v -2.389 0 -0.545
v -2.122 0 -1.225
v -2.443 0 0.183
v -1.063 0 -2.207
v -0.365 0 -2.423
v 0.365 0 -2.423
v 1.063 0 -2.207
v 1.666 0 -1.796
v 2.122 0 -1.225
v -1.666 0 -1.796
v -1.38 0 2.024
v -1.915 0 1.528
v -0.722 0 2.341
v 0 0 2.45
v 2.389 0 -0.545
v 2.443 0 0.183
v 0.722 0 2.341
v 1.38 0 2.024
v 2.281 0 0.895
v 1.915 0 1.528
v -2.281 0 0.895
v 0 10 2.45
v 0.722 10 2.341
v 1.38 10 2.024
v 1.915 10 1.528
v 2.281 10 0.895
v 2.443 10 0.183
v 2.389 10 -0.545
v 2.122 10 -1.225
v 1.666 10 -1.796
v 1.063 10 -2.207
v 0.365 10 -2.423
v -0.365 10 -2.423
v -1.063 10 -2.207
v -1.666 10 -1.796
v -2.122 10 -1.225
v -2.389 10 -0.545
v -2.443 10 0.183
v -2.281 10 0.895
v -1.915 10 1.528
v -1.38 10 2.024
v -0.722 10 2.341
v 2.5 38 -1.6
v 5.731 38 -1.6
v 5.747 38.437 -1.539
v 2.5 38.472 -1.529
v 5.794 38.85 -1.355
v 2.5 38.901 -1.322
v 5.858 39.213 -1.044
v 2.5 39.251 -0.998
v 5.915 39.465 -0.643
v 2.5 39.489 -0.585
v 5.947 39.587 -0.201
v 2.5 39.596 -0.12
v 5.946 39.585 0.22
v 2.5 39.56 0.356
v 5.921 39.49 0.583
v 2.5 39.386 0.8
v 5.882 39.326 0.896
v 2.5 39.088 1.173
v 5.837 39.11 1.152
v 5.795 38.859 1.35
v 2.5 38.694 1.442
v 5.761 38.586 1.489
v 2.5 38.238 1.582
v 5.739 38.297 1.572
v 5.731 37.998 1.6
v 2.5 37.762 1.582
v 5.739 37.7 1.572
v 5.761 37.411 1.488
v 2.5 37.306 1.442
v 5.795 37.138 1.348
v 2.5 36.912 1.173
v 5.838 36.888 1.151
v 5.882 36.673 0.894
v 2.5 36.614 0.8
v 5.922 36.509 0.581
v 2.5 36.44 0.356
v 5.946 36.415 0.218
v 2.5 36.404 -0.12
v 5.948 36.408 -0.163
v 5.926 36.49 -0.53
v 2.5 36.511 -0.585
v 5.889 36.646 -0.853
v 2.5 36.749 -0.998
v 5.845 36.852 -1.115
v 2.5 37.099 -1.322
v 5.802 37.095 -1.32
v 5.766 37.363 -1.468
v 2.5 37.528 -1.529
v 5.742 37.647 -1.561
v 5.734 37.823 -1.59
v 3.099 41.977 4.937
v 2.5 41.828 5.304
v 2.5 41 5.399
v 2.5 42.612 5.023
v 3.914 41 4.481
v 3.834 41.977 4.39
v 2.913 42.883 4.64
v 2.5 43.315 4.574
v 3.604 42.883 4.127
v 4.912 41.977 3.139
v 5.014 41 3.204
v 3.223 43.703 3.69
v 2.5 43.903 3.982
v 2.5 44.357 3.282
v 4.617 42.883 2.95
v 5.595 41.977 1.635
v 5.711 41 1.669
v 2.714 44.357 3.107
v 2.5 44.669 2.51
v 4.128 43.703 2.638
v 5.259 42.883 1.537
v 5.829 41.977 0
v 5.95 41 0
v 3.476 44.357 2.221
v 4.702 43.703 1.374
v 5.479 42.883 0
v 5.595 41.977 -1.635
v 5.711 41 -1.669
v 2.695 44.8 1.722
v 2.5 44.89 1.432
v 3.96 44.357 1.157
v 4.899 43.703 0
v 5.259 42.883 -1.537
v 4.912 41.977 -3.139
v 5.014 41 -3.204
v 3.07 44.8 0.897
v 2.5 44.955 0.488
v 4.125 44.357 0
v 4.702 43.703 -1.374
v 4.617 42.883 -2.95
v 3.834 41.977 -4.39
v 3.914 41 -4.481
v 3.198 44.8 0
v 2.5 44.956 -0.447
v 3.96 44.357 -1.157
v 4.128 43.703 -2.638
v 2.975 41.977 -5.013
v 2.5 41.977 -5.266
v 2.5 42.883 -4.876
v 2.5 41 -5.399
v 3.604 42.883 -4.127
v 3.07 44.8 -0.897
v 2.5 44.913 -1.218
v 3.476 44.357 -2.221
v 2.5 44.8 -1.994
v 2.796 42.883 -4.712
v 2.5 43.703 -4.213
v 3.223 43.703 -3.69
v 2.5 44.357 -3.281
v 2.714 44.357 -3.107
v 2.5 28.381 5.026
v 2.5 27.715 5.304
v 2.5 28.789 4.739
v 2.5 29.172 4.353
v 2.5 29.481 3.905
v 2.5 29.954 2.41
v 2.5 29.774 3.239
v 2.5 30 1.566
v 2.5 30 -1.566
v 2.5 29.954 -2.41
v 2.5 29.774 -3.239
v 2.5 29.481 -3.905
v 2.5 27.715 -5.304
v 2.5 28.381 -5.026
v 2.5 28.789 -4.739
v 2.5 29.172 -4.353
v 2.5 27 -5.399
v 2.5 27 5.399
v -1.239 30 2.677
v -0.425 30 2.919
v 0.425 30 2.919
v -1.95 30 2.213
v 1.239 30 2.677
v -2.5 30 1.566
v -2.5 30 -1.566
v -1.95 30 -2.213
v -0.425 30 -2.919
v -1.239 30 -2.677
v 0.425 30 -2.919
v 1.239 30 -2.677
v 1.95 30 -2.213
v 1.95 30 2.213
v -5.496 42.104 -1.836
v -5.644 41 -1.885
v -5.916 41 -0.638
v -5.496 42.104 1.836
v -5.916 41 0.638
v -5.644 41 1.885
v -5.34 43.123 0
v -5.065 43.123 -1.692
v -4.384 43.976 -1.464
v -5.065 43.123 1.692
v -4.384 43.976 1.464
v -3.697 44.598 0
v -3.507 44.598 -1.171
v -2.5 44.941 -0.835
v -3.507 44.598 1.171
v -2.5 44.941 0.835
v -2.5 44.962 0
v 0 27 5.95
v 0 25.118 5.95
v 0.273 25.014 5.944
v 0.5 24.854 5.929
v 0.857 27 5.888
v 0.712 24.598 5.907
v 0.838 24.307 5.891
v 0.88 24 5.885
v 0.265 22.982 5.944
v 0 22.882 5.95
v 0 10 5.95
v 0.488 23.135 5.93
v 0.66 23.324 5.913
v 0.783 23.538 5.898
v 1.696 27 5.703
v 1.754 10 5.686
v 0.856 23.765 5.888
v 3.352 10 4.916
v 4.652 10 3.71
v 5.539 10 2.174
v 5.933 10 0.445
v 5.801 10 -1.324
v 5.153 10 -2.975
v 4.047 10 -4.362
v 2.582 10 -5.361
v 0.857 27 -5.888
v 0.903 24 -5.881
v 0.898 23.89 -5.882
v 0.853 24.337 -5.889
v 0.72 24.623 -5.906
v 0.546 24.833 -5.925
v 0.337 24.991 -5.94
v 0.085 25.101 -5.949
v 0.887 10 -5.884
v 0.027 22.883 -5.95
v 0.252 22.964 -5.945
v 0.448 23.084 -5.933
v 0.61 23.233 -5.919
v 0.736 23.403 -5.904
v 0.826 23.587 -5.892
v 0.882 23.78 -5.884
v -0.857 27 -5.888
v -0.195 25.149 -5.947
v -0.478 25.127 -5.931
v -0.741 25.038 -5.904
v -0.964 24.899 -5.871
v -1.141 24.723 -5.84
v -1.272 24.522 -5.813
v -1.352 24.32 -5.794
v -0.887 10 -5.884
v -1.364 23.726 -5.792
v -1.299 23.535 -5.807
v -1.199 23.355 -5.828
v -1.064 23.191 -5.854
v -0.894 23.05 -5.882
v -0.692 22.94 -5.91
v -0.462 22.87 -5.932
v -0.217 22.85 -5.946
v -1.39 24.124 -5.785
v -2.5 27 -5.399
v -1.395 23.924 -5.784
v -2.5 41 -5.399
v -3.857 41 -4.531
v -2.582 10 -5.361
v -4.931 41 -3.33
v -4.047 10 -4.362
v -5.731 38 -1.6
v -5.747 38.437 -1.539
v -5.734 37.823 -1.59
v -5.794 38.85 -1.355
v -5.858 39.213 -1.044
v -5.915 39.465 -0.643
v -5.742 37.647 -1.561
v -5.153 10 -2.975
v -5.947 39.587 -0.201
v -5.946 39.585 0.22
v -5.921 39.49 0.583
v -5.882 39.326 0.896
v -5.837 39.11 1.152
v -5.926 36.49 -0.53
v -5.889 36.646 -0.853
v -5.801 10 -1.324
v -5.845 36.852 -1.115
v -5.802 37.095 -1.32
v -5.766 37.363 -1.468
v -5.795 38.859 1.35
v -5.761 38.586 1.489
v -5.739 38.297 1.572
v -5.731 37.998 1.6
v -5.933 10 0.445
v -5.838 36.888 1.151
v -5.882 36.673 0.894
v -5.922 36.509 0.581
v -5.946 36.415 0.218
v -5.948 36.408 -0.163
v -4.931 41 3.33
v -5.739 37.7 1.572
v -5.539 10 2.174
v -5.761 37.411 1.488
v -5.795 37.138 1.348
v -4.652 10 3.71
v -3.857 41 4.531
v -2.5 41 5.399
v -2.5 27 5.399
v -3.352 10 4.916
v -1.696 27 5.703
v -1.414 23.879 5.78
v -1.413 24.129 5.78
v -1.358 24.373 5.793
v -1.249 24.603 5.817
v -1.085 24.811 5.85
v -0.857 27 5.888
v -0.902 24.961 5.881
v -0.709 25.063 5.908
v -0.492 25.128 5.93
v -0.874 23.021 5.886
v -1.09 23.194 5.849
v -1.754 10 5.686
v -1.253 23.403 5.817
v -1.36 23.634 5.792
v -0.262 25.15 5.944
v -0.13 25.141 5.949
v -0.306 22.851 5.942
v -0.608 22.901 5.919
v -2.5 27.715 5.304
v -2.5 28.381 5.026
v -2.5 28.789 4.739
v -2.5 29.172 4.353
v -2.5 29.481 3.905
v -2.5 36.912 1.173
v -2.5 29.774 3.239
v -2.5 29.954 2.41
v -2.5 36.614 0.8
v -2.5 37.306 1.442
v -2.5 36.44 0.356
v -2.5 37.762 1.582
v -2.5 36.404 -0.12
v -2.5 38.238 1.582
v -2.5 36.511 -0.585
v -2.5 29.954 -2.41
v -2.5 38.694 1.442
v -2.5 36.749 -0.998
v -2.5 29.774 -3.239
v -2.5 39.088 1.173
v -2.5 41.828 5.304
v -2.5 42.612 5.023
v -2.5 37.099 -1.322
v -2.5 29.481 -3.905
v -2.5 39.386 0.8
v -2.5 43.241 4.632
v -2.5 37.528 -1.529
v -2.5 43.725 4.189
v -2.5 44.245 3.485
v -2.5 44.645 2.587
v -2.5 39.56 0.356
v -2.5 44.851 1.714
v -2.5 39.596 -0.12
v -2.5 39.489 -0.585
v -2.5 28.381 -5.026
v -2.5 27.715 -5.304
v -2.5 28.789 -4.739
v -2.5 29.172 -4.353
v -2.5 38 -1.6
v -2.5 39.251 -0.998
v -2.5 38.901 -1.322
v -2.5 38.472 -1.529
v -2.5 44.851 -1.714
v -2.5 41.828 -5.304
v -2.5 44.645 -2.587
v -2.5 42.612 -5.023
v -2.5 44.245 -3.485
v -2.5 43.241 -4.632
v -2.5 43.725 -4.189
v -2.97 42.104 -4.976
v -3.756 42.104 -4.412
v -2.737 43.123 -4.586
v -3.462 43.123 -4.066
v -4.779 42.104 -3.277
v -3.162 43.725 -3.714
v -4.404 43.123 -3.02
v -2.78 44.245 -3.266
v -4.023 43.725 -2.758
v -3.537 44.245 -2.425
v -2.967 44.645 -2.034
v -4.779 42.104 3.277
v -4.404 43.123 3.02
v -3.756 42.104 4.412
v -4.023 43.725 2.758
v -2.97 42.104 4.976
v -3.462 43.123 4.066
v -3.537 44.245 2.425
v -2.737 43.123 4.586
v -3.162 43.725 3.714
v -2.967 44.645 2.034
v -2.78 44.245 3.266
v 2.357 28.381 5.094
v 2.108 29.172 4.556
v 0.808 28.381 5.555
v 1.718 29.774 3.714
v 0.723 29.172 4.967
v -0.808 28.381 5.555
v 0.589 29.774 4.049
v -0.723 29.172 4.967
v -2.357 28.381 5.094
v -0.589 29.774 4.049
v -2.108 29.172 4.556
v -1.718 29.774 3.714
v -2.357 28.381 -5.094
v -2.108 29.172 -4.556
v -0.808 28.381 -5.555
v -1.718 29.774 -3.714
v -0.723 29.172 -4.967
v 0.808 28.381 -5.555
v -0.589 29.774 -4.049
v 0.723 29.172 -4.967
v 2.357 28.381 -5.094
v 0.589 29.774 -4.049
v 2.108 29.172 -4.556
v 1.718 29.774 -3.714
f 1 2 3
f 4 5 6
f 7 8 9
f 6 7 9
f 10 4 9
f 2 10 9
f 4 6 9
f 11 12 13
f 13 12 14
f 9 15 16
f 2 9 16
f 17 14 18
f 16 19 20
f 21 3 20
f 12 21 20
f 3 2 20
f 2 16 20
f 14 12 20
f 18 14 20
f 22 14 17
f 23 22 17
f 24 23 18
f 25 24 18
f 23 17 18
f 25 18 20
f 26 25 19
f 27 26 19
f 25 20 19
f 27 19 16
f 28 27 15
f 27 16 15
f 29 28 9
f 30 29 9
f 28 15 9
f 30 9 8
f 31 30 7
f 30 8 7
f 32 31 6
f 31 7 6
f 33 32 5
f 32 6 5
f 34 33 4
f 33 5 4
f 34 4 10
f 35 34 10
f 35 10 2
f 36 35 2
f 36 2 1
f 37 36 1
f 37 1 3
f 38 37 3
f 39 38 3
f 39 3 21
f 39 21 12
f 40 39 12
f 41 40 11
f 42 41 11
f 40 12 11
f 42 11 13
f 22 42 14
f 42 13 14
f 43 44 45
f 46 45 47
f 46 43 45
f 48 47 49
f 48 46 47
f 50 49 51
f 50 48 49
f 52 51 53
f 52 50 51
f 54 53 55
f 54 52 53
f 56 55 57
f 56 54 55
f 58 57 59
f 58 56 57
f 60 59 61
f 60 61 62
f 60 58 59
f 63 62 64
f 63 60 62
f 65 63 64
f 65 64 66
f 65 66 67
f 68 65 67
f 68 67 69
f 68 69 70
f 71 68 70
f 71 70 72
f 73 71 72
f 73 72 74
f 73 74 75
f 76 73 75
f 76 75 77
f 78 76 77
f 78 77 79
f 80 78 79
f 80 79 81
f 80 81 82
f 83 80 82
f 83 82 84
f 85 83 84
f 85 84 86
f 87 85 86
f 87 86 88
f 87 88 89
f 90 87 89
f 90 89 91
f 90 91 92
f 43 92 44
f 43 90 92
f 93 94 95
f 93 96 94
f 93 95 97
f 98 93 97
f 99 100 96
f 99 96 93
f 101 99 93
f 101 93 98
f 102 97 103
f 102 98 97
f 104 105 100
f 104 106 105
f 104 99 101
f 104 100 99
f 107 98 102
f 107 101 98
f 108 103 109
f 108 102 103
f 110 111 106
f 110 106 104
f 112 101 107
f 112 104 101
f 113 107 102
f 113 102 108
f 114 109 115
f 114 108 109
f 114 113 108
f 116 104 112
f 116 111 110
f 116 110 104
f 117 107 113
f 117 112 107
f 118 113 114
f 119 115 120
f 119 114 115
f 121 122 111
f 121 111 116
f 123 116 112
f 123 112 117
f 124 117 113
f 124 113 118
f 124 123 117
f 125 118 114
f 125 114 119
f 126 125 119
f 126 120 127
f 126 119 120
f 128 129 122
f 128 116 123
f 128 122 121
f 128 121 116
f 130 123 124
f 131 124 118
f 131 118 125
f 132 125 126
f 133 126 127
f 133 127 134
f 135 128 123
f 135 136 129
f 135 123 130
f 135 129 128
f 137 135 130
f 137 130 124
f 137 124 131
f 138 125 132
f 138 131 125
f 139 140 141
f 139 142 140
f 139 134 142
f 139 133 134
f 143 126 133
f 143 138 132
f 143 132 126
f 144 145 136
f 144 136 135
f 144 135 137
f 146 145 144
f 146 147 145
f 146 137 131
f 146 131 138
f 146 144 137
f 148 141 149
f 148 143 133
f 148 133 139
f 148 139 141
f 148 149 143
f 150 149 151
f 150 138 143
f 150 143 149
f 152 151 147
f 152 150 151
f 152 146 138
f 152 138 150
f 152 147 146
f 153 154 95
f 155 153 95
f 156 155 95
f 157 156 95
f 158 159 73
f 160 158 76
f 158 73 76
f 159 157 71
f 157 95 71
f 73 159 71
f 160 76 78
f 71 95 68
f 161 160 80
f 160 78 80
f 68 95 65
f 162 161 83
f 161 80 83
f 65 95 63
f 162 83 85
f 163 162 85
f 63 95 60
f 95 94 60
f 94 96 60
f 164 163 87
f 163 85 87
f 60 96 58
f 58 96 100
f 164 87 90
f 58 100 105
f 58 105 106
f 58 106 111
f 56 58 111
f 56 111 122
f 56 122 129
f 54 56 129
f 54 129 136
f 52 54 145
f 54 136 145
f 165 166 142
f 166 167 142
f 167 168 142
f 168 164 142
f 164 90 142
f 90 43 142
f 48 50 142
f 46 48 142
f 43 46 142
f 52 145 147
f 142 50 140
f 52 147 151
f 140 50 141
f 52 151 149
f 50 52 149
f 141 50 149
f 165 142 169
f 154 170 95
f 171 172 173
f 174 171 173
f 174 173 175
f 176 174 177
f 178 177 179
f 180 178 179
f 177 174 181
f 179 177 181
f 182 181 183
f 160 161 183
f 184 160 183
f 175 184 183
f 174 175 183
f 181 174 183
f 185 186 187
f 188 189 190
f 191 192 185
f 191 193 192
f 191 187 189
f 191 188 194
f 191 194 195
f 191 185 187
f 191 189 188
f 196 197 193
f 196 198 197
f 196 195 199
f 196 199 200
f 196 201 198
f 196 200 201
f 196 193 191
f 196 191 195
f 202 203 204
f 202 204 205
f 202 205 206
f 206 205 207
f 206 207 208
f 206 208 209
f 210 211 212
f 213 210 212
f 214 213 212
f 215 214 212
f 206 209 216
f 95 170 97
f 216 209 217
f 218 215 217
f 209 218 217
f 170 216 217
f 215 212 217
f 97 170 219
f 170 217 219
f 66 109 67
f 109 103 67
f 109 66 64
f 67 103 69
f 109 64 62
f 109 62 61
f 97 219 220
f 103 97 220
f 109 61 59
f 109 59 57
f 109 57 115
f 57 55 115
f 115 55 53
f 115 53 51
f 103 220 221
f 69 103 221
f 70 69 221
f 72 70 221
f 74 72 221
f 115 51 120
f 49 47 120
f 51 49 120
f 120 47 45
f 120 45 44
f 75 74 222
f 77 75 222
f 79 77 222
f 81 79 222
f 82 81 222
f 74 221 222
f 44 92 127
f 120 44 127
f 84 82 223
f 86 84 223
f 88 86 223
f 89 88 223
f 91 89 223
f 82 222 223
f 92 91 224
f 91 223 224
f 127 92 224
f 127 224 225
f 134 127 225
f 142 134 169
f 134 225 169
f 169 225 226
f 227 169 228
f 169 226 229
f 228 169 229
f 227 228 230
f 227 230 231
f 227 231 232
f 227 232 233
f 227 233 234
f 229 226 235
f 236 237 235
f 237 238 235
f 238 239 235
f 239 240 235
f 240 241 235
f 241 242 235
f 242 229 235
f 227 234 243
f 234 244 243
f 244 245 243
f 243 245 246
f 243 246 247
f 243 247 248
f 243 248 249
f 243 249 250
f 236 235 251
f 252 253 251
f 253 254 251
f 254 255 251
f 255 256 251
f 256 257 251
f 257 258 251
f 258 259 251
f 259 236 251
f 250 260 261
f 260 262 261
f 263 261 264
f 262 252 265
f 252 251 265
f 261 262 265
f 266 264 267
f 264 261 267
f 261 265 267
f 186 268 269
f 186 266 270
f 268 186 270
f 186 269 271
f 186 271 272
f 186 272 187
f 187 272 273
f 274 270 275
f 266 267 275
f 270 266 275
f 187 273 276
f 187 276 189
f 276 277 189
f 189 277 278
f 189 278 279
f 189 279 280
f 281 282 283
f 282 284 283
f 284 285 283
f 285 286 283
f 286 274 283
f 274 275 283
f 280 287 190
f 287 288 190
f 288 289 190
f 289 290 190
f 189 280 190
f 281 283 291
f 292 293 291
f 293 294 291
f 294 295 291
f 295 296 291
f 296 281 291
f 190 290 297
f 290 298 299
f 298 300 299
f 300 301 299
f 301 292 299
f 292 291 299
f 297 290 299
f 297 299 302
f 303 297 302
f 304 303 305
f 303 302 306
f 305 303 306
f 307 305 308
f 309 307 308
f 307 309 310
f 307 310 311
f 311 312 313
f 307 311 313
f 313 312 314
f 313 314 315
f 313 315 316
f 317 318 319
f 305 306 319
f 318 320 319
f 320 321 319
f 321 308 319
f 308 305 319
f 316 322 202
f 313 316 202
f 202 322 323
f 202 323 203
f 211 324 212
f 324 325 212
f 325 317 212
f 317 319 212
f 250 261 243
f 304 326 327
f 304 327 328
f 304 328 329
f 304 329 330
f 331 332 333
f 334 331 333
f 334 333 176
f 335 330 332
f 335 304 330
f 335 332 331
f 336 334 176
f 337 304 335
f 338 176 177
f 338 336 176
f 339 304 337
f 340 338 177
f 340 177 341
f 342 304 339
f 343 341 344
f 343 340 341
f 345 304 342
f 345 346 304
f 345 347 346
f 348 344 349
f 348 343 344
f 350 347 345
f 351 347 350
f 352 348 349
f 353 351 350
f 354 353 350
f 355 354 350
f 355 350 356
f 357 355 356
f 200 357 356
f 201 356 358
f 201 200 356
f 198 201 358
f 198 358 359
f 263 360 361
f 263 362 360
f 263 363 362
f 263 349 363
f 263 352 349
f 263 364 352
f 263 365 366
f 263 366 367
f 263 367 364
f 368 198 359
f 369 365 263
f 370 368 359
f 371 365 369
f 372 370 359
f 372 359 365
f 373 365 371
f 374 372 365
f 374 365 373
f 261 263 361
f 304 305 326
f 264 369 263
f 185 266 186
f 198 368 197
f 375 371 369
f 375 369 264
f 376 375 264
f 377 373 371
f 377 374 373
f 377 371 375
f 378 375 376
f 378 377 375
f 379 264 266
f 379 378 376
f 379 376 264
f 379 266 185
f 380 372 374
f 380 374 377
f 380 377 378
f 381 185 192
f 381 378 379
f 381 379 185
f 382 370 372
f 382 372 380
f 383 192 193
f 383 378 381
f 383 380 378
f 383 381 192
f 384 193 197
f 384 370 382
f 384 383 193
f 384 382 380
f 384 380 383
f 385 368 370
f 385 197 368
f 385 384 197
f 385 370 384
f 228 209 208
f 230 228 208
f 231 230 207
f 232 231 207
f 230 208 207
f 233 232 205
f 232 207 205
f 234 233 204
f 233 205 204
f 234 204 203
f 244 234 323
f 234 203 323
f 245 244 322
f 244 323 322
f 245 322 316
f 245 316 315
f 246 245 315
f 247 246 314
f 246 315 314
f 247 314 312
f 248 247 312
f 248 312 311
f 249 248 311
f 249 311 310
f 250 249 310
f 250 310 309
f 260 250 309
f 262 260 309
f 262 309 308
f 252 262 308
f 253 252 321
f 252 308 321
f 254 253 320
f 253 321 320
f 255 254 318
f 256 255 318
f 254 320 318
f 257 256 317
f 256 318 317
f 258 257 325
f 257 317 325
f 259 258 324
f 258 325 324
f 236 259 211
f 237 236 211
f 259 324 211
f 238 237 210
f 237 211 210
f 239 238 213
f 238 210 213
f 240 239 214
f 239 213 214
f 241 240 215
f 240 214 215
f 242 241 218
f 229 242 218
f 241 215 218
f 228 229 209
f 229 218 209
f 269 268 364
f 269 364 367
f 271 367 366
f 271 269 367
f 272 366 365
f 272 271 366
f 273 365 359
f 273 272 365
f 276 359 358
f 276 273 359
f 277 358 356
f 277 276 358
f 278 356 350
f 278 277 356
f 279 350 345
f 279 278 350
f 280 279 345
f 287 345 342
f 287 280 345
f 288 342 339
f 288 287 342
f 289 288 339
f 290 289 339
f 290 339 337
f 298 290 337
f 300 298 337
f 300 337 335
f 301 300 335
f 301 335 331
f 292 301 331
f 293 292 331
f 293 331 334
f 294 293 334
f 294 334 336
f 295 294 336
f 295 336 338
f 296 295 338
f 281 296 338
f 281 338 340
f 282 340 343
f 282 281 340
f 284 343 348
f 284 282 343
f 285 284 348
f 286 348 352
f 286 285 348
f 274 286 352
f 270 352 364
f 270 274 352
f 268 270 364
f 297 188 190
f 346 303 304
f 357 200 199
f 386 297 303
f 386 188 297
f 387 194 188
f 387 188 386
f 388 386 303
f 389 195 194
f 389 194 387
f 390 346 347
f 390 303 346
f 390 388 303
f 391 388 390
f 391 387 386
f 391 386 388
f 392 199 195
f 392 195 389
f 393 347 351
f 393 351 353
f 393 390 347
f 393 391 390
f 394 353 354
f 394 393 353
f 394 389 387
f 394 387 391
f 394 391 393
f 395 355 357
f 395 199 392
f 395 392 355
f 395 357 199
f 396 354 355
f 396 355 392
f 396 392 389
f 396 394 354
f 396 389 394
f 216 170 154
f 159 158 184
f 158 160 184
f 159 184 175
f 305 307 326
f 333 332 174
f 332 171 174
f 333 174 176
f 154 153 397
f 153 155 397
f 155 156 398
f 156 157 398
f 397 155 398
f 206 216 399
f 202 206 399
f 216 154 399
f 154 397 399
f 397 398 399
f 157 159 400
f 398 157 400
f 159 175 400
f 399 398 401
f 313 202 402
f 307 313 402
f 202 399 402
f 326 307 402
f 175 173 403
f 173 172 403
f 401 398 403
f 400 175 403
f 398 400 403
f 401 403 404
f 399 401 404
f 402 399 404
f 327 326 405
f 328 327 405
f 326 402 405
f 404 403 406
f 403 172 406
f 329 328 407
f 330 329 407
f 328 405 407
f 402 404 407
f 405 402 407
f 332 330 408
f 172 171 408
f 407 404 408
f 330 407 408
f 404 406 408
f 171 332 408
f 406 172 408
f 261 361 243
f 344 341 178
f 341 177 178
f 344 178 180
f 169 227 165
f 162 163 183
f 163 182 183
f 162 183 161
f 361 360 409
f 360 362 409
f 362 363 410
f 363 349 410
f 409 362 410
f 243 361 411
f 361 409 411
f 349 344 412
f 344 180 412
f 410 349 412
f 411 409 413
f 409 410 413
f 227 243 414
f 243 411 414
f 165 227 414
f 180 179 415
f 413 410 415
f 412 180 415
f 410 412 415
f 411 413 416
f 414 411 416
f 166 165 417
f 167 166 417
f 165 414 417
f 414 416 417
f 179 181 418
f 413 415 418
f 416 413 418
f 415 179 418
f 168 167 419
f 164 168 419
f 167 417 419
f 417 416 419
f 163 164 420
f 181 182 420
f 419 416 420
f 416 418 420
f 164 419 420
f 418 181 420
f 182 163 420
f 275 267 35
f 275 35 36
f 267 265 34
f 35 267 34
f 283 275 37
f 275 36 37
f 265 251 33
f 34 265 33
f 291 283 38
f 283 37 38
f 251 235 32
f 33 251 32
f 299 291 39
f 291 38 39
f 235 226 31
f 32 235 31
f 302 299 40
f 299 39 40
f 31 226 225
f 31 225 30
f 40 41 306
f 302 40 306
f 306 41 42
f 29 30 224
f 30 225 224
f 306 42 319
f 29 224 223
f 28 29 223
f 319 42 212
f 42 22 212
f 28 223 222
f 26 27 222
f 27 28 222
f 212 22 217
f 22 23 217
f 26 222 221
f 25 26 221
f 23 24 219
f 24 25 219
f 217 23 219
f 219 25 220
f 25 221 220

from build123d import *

# Parameters (mm, degrees)
SKETCH1_R               = 2.45
BOSS_EXTRUDE1_DEPTH     = 10
SKETCH2_R               = 5.95
BOSS_EXTRUDE2_DEPTH     = 35
SKETCH4_W               = 11.9
SKETCH4_H               = 15
CUT_EXTRUDE1_DEPTH      = 2.5
CUT_EXTRUDE2_DEPTH      = 46.779962866
CUT_EXTRUDE2_DEPTH_BACK = 46.779962866
SKETCH5_R               = 1.6
FILLET1_R               = 4
FILLET2_R               = 3
SKETCH6_R               = 1.15
CUT_EXTRUDE3_DEPTH      = 15


with BuildPart() as part:
    # Sketch1 → Boss-Extrude1 (new body)
    with BuildSketch(Plane(origin=(0, 0, 0), x_dir=(1, 0, 0), z_dir=(0, 1, 0))):
        with Locations(Location((0, 0, 0), (0, 0, 270))):
            Circle(SKETCH1_R)
    extrude(amount=BOSS_EXTRUDE1_DEPTH)

    # Sketch2 → Boss-Extrude2 (add)
    with BuildSketch(Plane(origin=(0, 10, 0), x_dir=(1, 0, 0), z_dir=(0, 1, 0))):
        with Locations(Location((0, 0, 0), (0, 0, 270))):
            Circle(SKETCH2_R)
    extrude(amount=BOSS_EXTRUDE2_DEPTH)

    # Sketch4 → Cut-Extrude1 (cut, symmetric)
    with BuildSketch(Plane(origin=(0, 0, 0), x_dir=(0, 0, -1), z_dir=(1, 0, 0))):
        with Locations((0, 37.5)):
            Rectangle(SKETCH4_W, SKETCH4_H)
    extrude(amount=CUT_EXTRUDE1_DEPTH, both=True, mode=Mode.SUBTRACT)

    # Sketch5 → Cut-Extrude2 (cut, two sides: drawn at the far end of the back side and taken through both)
    with BuildSketch(Plane(origin=(0, 0, 0), x_dir=(0, 0, -1), z_dir=(1, 0, 0)).offset(-CUT_EXTRUDE2_DEPTH_BACK)):
        with Locations((0, 38)):
            Circle(SKETCH5_R)
    extrude(amount=CUT_EXTRUDE2_DEPTH + CUT_EXTRUDE2_DEPTH_BACK, mode=Mode.SUBTRACT)

    # Fillet1
    # the kernel refuses this fillet: 4 mm, written as the material it takes off along each edge
    with BuildSketch(Plane(origin=(0, 45, 0), x_dir=(-0.9484971142590468, 0, 0.31678577026479715), z_dir=(-0.31678577026479715, 0, -0.9484971142590468))) as fillet1_piece_1:
        with BuildLine():
            CenterArc((5.95 - FILLET1_R, -FILLET1_R), FILLET1_R, 0, 90)
            Line((5.95 - FILLET1_R, 0), (5.95, 0))
            Line((5.95, 0), (5.95, -FILLET1_R))
        make_face()
    revolve(axis=Axis((0, 45, 0), (0, 1, 0)), revolution_arc=323.062694348, mode=Mode.SUBTRACT)
    with BuildSketch(Plane(origin=(0, 45, 0), x_dir=(0.948497114259044, 0, -0.31678577026480526), z_dir=(0.31678577026480526, 0, 0.948497114259044))) as fillet1_piece_2:
        with BuildLine():
            CenterArc((5.95 - FILLET1_R, -FILLET1_R), FILLET1_R, 0, 90)
            Line((5.95 - FILLET1_R, 0), (5.95, 0))
            Line((5.95, 0), (5.95, -FILLET1_R))
        make_face()
    revolve(axis=Axis((0, 45, 0), (0, 1, 0)), revolution_arc=323.062694348, mode=Mode.SUBTRACT)

    # Fillet2
    fillet2_edges = [part.edges().sort_by_distance(p)[0] for p in [
        (0, 30, -5.95),
        (1.279967228, 30, 5.810695646),
    ]]
    fillet(fillet2_edges, radius=FILLET2_R)

    # Sketch6 → Cut-Extrude3 (cut)
    with BuildSketch(Plane(origin=(-0.011753066, 0, 5.949988392), x_dir=(0.9999980490826653, 0, 0.0019753052582657496), z_dir=(-0.0019753052582657496, 0, 0.9999980490826653))):
        with Locations((-0.258432266, 24)):
            Circle(SKETCH6_R)
    extrude(amount=-CUT_EXTRUDE3_DEPTH, mode=Mode.SUBTRACT)


solid = part.part
